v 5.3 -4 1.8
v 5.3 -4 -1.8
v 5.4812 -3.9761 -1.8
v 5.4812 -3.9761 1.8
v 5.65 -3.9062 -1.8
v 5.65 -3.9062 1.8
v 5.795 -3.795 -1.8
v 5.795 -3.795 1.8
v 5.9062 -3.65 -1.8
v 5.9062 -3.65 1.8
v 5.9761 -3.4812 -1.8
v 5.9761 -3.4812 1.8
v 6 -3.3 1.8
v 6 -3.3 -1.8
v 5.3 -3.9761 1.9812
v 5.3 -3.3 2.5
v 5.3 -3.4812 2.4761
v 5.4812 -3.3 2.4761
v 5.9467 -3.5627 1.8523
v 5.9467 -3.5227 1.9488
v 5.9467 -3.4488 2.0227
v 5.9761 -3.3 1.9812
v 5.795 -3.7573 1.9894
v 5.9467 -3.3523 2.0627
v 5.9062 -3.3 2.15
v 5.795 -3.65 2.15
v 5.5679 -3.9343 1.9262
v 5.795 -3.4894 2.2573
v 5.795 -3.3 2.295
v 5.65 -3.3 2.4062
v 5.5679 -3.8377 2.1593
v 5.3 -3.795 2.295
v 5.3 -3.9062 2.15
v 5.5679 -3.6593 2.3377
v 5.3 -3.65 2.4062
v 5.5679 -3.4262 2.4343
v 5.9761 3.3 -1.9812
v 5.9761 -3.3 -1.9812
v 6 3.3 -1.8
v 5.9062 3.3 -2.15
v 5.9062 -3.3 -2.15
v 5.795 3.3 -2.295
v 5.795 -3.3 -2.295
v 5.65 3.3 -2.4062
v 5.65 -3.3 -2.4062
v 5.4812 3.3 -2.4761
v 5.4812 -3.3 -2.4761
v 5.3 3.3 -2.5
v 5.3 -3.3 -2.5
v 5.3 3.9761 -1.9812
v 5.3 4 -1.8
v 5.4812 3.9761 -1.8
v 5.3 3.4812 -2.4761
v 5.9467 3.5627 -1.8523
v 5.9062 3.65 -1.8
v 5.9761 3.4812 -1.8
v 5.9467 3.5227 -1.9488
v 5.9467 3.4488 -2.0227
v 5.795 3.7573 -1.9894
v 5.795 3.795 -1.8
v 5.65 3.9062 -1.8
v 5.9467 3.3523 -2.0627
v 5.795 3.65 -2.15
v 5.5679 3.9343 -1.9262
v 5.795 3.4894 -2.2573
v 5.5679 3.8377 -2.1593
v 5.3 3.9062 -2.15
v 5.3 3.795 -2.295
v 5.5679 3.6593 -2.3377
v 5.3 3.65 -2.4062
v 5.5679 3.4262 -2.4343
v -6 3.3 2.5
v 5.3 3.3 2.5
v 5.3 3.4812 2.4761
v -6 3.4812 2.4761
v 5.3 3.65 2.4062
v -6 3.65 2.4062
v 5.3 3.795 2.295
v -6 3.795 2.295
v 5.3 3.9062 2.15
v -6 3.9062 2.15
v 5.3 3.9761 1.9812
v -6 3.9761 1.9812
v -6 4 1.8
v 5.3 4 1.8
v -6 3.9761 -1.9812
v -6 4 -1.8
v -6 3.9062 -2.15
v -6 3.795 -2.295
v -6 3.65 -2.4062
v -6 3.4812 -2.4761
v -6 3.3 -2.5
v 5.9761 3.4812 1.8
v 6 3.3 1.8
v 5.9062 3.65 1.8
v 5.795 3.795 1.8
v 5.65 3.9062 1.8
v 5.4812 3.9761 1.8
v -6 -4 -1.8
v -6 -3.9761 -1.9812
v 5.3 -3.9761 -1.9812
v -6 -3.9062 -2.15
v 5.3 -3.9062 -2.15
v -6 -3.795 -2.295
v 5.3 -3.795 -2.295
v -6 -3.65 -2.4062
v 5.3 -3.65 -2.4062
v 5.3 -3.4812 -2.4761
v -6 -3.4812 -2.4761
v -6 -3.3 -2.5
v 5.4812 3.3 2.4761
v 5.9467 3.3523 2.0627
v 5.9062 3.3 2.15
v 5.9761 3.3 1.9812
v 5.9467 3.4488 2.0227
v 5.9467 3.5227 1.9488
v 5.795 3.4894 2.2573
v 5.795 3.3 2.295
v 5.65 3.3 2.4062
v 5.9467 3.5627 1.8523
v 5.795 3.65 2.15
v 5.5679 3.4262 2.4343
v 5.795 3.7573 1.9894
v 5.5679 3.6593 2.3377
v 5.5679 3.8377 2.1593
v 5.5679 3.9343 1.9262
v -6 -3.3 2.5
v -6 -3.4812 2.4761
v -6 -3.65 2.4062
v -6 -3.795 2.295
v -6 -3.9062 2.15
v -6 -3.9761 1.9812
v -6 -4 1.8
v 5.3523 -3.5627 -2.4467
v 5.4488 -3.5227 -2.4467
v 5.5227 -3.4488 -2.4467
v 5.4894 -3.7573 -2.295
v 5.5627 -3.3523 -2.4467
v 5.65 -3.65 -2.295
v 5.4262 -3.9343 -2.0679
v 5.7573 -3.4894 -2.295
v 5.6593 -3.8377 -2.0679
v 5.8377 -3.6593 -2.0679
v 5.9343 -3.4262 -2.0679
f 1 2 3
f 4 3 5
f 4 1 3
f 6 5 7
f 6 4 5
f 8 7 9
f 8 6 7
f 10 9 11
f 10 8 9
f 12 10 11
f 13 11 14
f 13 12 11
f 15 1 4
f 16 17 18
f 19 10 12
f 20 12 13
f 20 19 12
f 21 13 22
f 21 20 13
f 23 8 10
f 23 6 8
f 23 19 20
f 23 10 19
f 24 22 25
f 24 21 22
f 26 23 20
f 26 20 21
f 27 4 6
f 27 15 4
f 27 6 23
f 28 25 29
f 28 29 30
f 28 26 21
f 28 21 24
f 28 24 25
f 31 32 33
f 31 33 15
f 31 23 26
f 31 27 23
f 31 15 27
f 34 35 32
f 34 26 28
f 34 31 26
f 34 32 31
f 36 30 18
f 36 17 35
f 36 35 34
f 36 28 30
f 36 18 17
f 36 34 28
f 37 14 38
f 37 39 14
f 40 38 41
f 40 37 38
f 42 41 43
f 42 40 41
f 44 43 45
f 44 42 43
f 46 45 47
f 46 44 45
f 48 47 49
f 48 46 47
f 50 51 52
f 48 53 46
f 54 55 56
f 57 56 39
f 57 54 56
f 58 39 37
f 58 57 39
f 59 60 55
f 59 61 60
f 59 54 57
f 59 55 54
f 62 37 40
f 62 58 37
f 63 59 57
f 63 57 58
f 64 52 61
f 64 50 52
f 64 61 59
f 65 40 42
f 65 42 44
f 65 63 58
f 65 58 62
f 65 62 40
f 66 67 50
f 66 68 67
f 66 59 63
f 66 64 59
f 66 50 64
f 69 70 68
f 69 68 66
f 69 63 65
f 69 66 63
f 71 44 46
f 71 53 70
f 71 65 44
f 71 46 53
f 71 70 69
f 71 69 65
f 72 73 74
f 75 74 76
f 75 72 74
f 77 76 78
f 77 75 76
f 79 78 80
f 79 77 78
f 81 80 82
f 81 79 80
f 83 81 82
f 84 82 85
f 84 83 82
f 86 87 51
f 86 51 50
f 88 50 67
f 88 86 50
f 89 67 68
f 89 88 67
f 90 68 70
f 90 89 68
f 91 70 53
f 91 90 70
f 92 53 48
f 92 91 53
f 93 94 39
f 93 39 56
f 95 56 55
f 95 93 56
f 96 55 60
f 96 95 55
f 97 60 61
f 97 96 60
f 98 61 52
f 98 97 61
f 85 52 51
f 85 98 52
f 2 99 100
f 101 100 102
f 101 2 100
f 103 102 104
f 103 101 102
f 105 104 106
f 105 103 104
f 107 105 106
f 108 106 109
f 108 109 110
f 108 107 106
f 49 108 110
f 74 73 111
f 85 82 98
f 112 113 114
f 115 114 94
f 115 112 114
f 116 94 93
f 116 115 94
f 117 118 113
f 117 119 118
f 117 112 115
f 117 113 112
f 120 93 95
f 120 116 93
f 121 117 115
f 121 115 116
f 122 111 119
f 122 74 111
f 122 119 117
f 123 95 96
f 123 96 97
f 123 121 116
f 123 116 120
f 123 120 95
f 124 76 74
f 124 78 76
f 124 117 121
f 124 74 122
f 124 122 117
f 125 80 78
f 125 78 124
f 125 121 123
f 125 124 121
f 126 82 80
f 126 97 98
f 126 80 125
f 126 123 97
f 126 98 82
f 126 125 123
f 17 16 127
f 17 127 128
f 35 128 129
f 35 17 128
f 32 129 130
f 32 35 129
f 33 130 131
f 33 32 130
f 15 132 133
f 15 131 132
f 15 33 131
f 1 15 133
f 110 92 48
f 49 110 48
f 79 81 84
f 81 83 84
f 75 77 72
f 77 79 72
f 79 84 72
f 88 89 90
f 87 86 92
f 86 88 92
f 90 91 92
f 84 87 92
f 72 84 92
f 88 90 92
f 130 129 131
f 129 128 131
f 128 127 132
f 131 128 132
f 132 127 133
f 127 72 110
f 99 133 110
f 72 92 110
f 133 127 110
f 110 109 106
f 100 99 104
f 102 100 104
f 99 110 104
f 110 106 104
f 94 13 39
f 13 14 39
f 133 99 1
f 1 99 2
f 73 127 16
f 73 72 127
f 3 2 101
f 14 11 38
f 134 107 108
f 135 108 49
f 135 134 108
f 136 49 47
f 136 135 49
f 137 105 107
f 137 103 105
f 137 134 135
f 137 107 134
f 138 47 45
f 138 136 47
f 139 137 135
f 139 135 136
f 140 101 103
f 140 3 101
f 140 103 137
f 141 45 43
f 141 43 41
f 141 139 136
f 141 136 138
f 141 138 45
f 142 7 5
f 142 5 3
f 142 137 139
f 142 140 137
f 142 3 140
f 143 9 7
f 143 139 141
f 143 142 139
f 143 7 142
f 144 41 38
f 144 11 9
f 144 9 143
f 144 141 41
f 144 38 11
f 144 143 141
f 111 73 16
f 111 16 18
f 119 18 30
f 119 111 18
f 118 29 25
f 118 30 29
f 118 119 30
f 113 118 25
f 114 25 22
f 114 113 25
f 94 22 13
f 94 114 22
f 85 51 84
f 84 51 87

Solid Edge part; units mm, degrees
sketch "Sketch1" plane through (0, 0, 0) normal (0, 0, 1) x (1, 0, 0)
  line L0 (-6, -4) -> (6, -4)
  line L1 (6, -4) -> (6, 4)
  line L2 (6, 4) -> (-6, 4)
  line L3 (-6, 4) -> (-6, -4)
  dimension "D1" = 12
  dimension "D2" = 8
extrude "Ajout_matière_1" add sketch "Sketch1" along normal mid plane 5
fillet "Congé_1" radius 0.7 8 edges at (0, 4, 2.5) (0, -4, 2.5) (0, 4, -2.5) (6, 0, 2.5) (6, 4, 0) (6, -4, 0) (6, 0, -2.5) (0, -4, -2.5)
properties material "Graphite"
